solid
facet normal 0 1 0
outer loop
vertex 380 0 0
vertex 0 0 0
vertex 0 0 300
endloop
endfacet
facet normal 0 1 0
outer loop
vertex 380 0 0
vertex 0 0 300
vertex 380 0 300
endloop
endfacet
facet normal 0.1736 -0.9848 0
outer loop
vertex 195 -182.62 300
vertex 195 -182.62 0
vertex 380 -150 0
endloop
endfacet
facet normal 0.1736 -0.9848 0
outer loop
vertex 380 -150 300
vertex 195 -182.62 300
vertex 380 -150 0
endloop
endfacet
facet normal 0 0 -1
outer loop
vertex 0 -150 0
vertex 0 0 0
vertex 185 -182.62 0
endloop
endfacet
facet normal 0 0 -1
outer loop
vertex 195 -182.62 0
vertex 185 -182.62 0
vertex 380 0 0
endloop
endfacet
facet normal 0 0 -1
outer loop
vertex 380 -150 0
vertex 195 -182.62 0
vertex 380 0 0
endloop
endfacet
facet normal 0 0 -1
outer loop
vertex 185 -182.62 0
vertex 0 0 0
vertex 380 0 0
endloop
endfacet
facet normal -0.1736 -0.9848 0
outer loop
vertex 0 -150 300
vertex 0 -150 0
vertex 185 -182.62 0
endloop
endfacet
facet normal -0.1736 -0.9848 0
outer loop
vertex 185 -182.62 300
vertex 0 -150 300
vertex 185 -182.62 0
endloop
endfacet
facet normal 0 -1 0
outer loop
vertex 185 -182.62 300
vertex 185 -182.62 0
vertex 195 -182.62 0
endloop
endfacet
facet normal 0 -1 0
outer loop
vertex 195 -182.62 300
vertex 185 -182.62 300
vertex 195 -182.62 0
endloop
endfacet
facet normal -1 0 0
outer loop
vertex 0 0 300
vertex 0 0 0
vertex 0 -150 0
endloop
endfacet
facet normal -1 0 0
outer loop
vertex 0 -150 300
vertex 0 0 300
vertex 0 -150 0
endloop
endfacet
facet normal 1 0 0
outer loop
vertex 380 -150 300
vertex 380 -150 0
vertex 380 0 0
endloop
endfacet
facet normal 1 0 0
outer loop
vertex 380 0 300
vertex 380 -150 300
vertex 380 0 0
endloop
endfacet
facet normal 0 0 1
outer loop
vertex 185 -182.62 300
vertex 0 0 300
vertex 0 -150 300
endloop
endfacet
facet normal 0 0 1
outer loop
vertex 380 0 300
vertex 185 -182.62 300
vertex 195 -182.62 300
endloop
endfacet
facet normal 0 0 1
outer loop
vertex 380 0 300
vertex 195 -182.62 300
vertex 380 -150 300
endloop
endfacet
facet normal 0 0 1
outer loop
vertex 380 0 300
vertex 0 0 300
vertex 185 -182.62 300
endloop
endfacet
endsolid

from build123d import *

# Parameters (mm, degrees)
F0_W     = 380
F0_H     = 10
F0_W_2   = 10
F0_H_2   = 120
F1_DEPTH = 300


with BuildPart() as f1:
    # F0 (on Top) → F1 (new body)
    with BuildSketch(Plane.XY):
        with Locations((190, -5)):
            Rectangle(F0_W, F0_H)
        Polygon((380, -10), (0, -10), (0, -150), (185, -182.620491), (185, -62.620491), (195, -62.620491), (195, -182.620491), (380, -150), align=None)
        with Locations((190, -122.620491)):
            Rectangle(F0_W_2, F0_H_2)
    extrude(amount=F1_DEPTH)


solid = f1.part
